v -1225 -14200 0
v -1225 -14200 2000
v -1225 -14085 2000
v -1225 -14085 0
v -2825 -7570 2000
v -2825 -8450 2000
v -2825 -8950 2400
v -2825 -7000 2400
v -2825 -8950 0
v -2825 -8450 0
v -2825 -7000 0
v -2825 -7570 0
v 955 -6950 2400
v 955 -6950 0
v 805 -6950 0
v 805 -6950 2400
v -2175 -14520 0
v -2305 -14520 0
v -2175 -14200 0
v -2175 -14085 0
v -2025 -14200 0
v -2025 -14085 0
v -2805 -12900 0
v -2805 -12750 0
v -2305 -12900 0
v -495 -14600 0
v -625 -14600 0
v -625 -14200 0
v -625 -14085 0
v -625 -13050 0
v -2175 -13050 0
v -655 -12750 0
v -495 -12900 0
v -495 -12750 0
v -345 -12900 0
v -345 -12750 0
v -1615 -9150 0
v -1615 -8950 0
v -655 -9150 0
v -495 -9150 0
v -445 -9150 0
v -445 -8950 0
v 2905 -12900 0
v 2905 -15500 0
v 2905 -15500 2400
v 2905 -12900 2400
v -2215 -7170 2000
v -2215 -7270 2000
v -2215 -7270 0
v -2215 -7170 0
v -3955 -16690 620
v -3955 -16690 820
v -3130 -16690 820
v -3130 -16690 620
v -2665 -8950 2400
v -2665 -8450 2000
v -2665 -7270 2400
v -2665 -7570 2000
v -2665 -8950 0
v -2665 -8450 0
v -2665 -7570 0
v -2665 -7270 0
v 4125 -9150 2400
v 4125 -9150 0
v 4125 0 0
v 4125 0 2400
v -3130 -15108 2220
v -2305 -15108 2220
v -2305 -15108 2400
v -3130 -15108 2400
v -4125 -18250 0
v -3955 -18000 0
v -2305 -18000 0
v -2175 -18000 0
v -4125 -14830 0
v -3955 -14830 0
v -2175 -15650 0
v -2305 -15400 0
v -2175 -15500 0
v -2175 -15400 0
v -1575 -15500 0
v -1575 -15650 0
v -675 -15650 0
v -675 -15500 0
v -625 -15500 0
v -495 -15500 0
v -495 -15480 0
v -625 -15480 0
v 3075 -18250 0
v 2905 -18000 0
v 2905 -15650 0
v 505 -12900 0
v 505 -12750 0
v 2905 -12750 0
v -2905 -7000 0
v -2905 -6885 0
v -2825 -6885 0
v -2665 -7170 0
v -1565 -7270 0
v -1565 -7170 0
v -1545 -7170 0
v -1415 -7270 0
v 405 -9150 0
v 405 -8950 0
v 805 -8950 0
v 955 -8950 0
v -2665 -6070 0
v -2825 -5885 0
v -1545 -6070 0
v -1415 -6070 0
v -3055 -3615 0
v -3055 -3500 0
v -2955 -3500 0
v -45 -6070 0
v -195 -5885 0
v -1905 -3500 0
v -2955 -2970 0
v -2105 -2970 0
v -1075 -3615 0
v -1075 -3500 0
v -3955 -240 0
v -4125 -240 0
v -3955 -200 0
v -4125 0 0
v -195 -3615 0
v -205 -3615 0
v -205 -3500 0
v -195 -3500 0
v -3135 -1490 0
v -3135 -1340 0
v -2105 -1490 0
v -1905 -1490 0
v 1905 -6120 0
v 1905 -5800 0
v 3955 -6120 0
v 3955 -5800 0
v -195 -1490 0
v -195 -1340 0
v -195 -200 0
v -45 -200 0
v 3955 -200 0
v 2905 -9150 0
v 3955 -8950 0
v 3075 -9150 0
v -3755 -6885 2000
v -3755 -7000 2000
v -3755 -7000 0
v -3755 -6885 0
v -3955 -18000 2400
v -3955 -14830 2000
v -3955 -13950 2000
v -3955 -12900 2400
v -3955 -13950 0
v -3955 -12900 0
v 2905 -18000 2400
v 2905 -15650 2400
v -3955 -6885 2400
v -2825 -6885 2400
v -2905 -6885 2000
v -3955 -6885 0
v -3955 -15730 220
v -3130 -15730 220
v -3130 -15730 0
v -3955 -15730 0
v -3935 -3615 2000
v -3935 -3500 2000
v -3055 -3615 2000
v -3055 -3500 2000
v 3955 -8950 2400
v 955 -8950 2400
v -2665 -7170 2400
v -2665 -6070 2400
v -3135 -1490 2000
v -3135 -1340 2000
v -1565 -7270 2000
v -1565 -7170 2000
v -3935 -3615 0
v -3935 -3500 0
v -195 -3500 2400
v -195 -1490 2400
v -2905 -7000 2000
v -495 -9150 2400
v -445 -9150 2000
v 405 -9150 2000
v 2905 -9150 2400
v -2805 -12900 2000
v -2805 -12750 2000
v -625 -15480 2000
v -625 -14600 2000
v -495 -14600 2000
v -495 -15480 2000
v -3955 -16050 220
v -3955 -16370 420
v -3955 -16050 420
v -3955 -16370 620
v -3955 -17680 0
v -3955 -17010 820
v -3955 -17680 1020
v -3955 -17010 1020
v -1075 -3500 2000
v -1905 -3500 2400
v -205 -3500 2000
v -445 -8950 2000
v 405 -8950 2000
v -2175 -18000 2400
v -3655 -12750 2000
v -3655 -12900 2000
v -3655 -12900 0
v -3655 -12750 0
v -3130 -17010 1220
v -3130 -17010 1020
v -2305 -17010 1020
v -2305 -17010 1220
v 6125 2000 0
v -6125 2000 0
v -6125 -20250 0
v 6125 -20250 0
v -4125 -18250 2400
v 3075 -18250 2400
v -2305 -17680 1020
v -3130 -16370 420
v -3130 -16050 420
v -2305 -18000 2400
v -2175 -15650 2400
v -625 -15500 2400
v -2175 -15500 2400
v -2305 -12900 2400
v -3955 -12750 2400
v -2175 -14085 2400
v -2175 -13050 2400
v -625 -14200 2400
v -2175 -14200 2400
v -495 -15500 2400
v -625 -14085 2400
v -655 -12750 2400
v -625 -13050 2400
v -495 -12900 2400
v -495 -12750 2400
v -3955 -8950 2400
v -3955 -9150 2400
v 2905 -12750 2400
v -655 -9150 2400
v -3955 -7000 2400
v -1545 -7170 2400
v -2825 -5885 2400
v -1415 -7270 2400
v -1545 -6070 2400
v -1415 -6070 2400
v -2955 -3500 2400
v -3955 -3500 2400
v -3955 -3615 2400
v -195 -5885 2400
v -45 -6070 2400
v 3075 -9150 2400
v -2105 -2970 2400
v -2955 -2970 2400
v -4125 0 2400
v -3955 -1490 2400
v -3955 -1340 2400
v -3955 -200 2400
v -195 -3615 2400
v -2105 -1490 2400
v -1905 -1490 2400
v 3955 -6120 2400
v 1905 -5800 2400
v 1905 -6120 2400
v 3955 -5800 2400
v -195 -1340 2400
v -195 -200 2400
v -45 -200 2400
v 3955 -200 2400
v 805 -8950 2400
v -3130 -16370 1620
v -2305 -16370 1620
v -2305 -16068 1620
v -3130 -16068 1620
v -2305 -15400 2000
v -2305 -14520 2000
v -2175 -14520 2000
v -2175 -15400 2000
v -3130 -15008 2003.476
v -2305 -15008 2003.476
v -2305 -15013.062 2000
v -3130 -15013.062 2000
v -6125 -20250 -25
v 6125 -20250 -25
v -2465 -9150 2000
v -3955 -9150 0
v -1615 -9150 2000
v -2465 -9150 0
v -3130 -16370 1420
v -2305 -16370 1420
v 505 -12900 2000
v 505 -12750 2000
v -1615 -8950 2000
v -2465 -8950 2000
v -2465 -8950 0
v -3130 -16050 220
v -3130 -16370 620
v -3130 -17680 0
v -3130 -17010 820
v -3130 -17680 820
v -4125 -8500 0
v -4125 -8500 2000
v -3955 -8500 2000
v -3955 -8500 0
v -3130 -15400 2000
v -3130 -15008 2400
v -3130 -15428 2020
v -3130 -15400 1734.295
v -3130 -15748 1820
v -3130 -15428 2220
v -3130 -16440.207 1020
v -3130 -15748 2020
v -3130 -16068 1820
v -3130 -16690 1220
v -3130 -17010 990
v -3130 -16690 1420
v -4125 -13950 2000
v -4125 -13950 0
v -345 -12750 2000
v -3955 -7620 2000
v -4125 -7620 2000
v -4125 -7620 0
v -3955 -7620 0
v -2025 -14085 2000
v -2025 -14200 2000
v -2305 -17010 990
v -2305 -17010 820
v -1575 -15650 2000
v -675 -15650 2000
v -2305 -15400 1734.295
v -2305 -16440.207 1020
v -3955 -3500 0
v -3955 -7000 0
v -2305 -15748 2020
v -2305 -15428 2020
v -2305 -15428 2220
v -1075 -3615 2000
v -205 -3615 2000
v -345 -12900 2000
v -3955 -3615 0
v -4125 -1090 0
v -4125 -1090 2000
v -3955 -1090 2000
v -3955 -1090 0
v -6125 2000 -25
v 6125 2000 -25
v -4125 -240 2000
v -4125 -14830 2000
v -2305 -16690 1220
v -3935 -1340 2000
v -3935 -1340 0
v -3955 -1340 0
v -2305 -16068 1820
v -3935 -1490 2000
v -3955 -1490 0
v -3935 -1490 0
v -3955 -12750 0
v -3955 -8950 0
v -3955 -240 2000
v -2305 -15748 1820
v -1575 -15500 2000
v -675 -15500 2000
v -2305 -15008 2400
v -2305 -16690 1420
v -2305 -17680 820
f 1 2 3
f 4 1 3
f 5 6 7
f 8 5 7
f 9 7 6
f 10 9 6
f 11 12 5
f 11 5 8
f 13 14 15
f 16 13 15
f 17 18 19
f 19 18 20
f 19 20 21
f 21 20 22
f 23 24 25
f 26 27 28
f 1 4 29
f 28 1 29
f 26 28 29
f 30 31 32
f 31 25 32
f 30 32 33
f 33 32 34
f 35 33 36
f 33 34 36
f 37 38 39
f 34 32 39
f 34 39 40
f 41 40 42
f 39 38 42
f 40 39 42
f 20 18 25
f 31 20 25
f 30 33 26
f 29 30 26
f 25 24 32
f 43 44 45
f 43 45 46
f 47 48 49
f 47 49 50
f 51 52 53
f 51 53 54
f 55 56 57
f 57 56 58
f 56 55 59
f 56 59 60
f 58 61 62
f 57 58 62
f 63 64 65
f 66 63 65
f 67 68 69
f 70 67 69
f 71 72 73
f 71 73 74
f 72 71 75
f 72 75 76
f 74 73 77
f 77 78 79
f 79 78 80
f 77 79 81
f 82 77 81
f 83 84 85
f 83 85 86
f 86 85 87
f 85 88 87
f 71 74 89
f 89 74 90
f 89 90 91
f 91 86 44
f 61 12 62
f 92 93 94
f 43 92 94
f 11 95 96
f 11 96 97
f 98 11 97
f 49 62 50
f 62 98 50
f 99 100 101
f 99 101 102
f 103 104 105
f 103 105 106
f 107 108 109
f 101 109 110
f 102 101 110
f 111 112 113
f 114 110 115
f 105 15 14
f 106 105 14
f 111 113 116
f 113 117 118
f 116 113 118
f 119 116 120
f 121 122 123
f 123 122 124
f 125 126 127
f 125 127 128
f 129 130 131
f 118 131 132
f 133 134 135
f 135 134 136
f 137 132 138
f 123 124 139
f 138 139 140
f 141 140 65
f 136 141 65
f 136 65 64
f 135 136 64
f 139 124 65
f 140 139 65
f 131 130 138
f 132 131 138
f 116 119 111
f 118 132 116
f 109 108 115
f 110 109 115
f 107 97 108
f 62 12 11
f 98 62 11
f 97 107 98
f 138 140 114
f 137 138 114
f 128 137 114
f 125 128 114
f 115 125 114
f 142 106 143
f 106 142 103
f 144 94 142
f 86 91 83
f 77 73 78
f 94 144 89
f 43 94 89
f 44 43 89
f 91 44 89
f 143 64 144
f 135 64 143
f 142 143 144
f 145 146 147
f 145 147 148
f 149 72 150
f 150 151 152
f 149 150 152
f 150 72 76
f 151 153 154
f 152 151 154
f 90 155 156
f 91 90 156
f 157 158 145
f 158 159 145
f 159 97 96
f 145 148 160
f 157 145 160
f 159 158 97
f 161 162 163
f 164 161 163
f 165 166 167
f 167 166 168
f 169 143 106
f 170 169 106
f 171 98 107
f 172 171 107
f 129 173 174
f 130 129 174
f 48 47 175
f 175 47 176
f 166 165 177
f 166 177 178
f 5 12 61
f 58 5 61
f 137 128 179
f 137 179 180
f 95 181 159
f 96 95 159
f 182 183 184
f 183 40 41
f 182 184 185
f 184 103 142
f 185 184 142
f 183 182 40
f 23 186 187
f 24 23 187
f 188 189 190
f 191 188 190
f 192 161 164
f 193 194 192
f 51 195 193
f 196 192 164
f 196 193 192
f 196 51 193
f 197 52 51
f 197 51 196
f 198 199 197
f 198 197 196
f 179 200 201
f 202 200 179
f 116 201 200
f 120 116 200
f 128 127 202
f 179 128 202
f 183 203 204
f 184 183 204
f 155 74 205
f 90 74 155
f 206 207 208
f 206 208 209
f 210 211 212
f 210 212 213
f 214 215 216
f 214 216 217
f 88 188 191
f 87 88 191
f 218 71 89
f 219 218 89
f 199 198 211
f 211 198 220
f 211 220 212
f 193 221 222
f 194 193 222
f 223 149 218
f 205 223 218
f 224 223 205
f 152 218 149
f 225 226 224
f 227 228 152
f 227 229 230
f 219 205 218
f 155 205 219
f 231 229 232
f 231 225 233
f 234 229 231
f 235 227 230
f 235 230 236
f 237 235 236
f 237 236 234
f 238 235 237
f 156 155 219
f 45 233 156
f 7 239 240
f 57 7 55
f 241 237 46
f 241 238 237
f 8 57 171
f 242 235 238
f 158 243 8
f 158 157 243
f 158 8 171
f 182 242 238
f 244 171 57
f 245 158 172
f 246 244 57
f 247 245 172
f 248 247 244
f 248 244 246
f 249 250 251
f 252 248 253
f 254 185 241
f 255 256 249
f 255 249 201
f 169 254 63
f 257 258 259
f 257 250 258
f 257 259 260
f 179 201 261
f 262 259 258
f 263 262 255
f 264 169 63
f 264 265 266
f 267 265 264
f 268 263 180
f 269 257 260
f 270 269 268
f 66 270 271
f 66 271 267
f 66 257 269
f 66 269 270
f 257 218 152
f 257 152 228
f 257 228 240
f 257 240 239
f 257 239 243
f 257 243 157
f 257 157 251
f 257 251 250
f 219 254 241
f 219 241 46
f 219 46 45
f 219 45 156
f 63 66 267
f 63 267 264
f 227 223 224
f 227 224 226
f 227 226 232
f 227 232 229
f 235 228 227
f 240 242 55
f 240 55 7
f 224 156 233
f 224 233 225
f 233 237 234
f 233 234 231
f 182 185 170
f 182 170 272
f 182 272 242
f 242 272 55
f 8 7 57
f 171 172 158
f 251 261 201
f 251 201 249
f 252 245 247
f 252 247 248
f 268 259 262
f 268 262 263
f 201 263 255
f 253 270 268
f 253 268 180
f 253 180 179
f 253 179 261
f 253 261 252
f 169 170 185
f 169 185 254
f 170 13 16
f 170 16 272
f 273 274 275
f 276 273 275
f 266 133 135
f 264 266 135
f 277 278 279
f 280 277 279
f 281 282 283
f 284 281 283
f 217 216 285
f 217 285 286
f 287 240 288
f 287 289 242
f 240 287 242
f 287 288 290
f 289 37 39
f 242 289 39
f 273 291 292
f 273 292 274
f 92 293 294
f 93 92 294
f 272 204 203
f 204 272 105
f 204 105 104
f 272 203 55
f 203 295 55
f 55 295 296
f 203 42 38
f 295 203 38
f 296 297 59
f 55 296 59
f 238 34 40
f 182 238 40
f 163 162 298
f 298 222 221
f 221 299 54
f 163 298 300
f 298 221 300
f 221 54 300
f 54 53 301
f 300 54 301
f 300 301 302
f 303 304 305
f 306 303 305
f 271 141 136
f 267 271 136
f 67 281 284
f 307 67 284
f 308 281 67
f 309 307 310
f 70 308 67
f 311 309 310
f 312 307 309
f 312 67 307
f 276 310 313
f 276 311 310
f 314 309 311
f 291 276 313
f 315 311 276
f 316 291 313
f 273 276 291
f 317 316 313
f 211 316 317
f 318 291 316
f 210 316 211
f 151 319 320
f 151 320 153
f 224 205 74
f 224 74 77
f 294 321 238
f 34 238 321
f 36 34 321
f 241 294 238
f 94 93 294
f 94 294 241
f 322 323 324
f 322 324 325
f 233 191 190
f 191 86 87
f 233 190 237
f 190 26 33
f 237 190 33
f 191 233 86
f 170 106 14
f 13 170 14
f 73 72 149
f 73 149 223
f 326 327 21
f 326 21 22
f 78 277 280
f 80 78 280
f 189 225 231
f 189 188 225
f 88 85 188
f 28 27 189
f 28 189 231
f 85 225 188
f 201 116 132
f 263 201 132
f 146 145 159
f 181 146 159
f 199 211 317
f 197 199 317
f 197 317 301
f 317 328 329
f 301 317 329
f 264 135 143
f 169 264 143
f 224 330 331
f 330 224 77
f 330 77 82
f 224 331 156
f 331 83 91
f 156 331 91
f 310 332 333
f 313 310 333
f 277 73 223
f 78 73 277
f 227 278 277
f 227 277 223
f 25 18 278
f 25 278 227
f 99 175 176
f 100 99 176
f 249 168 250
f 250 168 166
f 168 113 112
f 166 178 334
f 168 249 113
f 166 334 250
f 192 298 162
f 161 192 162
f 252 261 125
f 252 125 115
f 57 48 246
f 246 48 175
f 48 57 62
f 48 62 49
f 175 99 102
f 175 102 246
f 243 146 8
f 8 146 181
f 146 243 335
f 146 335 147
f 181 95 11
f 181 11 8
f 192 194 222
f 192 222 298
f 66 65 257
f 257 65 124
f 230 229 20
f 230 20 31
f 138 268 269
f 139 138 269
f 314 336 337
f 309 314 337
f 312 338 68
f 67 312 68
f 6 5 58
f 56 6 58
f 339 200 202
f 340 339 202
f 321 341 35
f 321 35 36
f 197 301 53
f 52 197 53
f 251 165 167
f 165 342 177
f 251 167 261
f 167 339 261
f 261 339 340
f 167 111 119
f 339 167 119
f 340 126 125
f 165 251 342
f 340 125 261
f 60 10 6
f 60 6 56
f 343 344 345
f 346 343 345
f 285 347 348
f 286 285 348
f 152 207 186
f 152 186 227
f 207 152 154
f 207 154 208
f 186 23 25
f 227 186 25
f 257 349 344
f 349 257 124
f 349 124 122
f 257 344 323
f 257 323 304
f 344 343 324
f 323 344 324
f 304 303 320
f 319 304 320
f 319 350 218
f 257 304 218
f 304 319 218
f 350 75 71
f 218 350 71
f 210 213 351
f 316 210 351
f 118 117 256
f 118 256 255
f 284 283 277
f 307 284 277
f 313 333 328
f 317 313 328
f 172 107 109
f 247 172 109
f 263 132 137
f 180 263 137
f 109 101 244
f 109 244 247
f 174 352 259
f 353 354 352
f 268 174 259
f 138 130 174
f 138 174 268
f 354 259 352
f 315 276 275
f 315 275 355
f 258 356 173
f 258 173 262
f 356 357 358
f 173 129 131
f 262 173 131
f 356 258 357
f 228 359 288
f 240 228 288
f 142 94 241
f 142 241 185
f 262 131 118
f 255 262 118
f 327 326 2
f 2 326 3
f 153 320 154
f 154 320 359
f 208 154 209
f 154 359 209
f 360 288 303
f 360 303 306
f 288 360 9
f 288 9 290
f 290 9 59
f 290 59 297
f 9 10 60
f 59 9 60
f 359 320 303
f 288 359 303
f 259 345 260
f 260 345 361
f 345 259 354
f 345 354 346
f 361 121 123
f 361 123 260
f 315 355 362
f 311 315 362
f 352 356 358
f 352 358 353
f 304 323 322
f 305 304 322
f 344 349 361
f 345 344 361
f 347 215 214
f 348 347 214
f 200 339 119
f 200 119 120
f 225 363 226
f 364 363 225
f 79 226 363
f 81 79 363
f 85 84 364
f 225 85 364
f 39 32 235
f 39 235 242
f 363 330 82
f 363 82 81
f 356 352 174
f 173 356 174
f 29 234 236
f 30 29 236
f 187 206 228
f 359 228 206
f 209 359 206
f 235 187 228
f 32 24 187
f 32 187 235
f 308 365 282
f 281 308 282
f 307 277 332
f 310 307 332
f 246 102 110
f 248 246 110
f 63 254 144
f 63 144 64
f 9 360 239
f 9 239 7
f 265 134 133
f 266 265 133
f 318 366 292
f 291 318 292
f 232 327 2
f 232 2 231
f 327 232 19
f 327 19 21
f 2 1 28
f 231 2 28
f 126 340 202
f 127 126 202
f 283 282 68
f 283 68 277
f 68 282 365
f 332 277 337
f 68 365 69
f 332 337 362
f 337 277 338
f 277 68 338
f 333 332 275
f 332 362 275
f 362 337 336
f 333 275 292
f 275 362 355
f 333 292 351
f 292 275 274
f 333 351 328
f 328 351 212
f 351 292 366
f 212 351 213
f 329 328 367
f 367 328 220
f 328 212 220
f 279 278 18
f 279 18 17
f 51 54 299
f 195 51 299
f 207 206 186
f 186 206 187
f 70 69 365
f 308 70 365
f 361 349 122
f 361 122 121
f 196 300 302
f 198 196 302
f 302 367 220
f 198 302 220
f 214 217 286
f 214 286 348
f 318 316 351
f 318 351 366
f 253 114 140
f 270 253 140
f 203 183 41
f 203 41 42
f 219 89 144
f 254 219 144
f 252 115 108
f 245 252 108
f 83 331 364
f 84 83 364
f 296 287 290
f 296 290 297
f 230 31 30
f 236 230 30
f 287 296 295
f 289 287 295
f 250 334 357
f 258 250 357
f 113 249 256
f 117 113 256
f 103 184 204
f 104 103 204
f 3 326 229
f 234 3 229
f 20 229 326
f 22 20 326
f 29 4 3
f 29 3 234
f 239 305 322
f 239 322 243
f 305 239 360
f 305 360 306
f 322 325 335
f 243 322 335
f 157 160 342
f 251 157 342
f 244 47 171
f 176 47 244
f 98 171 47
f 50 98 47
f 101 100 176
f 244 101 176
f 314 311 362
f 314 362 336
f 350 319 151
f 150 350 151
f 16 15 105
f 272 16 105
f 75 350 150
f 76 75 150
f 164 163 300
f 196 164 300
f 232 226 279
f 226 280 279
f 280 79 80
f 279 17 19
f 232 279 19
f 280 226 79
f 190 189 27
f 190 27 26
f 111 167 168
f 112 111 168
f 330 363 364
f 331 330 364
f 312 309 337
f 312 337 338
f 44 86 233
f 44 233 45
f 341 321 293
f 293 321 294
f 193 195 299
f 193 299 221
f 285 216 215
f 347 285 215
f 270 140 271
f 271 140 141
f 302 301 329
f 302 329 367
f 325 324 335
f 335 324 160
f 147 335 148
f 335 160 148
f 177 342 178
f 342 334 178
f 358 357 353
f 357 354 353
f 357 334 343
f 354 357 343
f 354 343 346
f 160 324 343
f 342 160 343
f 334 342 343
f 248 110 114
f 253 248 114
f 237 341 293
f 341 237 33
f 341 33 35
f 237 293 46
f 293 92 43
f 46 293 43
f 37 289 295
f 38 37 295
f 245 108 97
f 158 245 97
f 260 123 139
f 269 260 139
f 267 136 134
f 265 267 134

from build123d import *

# Parameters (mm, degrees)
F0_W     = 1650
F0_H     = 5100
F0_W_2   = 1550
F0_H_2   = 1300
F0_W_3   = 3300
F0_H_3   = 3600
F0_H_4   = 1035
F0_W_4   = 5080
F0_H_5   = 2350
F0_W_5   = 3400
F0_H_6   = 2600
F0_W_6   = 1130
F0_H_7   = 1950
F0_W_7   = 1120
F0_H_8   = 1100
F0_W_8   = 3760
F0_H_9   = 1140
F0_W_9   = 1710
F0_H_10  = 2010
F0_W_10  = 850
F0_H_11  = 530
F1_DEPTH = 2400
F3_START = -400
F2_W     = 170
F2_H     = 850
F2_W_2   = 800
F2_H_2   = 150
F2_W_3   = 880
F2_H_3   = 115
F2_W_4   = 870
F2_W_5   = 850
F2_H_4   = 880
F2_W_6   = 650
F2_H_5   = 100
F2_W_7   = 160
F2_H_6   = 200
F2_W_8   = 130
F2_W_9   = 900
F3_DEPTH = 2000
F4_W     = 12250
F4_H     = 22250
F5_DEPTH = 25
F7_START = 825
F7_DEPTH = 825
F8_DEPTH = 825


with BuildPart() as f1:
    # F0 (on Top) → F1 (new body)
    with BuildSketch(Plane.XY):
        Polygon((4125, 0), (-4125, 0), (-4125, -9150), (-4125, -18250), (3075, -18250), (3075, -9150), (4125, -9150), align=None)
        with Locations((-3130, -15450)):
            Rectangle(F0_W, F0_H, mode=Mode.SUBTRACT)
        with Locations((-1400, -14850)):
            Rectangle(F0_W_2, F0_H_2, mode=Mode.SUBTRACT)
        with Locations((-2305, -10950)):
            Rectangle(F0_W_3, F0_H_3, mode=Mode.SUBTRACT)
        with Locations((-1400, -13567.5)):
            Rectangle(F0_W_2, F0_H_4, mode=Mode.SUBTRACT)
        with Locations((365, -16825)):
            Rectangle(F0_W_4, F0_H_5, mode=Mode.SUBTRACT)
        with Locations((1205, -14200)):
            Rectangle(F0_W_5, F0_H_6, mode=Mode.SUBTRACT)
        with Locations((1205, -10950)):
            Rectangle(F0_W_5, F0_H_3, mode=Mode.SUBTRACT)
        with Locations((-3390, -7975)):
            Rectangle(F0_W_6, F0_H_7, mode=Mode.SUBTRACT)
        with Locations((-2105, -6620)):
            Rectangle(F0_W_7, F0_H_8, mode=Mode.SUBTRACT)
        Polygon((-3955, -5885), (-3955, -3615), (-195, -3615), (-195, -5885), (-2825, -5885), (-2825, -6885), (-3955, -6885), align=None, mode=Mode.SUBTRACT)
        Polygon((-3955, -3500), (-3955, -1490), (-2105, -1490), (-2105, -2970), (-2105, -3500), (-2955, -3500), align=None, mode=Mode.SUBTRACT)
        with Locations((-2075, -770)):
            Rectangle(F0_W_8, F0_H_9, mode=Mode.SUBTRACT)
        with Locations((-1050, -2495)):
            Rectangle(F0_W_9, F0_H_10, mode=Mode.SUBTRACT)
        Polygon((-45, -6070), (-45, -200), (3955, -200), (3955, -5800), (1905, -5800), (1905, -6120), (3955, -6120), (3955, -8950), (955, -8950), (955, -6950), (805, -6950), (805, -8950), (-2665, -8950), (-2665, -7270), (-1415, -7270), (-1415, -6070), align=None, mode=Mode.SUBTRACT)
        with Locations((-2530, -3235)):
            Rectangle(F0_W_10, F0_H_11)
    extrude(amount=F1_DEPTH)

    # F2 (on face) → F3 (cut)
    with BuildSketch(Plane.XY.offset(2400).offset(F3_START)):
        with Locations((-4040, -665)):
            Rectangle(F2_W, F2_H)
        with Locations((-3535, -1415)):
            Rectangle(F2_W_2, F2_H_2)
        with Locations((-3495, -3557.5)):
            Rectangle(F2_W_3, F2_H_3)
        with Locations((-640, -3557.5)):
            Rectangle(F2_W_4, F2_H_3)
        with Locations((-3330, -6942.5)):
            Rectangle(F2_W_5, F2_H_3)
        with Locations((-4040, -8060)):
            Rectangle(F2_W, F2_H_4)
        with Locations((-1890, -7220)):
            Rectangle(F2_W_6, F2_H_5)
        with Locations((-2745, -8010)):
            Rectangle(F2_W_7, F2_H_4)
        with Locations((-2040, -9050)):
            Rectangle(F2_W_5, F2_H_6)
        with Locations((-20, -9050)):
            Rectangle(F2_W_5, F2_H_6)
        with Locations((-3230, -12825)):
            Rectangle(F2_W_5, F2_H_2)
        with Locations((80, -12825)):
            Rectangle(F2_W_5, F2_H_2)
        with Locations((-1625, -14142.5)):
            Rectangle(F2_W_2, F2_H_3)
        with Locations((-560, -15040)):
            Rectangle(F2_W_8, F2_H_4)
        with Locations((-1125, -15575)):
            Rectangle(F2_W_9, F2_H_2)
        with Locations((-2240, -14960)):
            Rectangle(F2_W_8, F2_H_4)
        with Locations((-4040, -14390)):
            Rectangle(F2_W, F2_H_4)
    extrude(amount=-F3_DEPTH, mode=Mode.SUBTRACT)


with BuildPart() as f5:
    # F4 (on Top) → F5 (new body)
    with BuildSketch(Plane.XY):
        with Locations((0, -9125)):
            Rectangle(F4_W, F4_H)
    extrude(amount=-F5_DEPTH)


with BuildPart() as f7:
    # F6 (on face) → F7 (new body)
    with BuildSketch(Plane(origin=(-2305, 0, 0), x_dir=(0, -1, 0), z_dir=(-1, 0, 0)).offset(F7_START)):
        Polygon((16050, 220), (15730, 220), (15730, 0), (17680, 0), (17680, 820), (17010, 820), (16690, 820), (16690, 620), (16370, 620), (16370, 420), (16050, 420), align=None)
        Polygon((17010, 820), (17680, 820), (17680, 1020), (17010, 1020), (17010, 990), align=None)
    extrude(amount=F7_DEPTH)

    # F6 (on face) → F8 (join)
    with BuildSketch(Plane(origin=(-2305, 0, 0), x_dir=(0, -1, 0), z_dir=(-1, 0, 0))):
        Polygon((15400, 2000), (15400, 1734.2952563354), (16440.20652771, 1020), (17010, 990), (17010, 1020), (17010, 1220), (16690, 1220), (16690, 1420), (16370, 1420), (16370, 1620), (16068, 1620), (16068, 1820), (15748, 1820), (15748, 2020), (15428, 2020), (15428, 2220), (15108, 2220), (15108, 2400), (15008, 2400), (15008, 2003.4761670724), (15013.0622367264, 2000), align=None)
        Polygon((17010, 820), (17680, 820), (17680, 1020), (17010, 1020), (17010, 990), align=None)
    extrude(amount=F8_DEPTH)


solid = Compound([f1.part, f5.part, f7.part])
